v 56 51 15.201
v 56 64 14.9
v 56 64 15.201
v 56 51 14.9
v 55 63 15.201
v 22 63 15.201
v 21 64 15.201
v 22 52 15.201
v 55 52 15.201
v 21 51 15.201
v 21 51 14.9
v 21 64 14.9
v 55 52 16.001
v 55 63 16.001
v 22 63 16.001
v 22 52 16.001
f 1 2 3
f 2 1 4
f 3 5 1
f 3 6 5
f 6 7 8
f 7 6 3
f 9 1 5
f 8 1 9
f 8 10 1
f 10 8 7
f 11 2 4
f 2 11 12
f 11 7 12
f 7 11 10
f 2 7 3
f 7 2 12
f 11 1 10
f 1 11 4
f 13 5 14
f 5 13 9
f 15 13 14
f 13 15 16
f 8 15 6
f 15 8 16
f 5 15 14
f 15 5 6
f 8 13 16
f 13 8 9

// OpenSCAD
error = 0.2; // how much increase for error during print
height = 16.0;

module screwHole(center=[0,0,0]) {
    bottomClearance = 0.6;
    $fn=40;
    translate(center) translate([0,0,bottomClearance]) {
        difference() {
            cylinder(h=height - bottomClearance, d=6 + 2*1.2);
            translate([0,0,-0.1]) cylinder(h=height + 0.1, d= 3.5);
            translate([0,0,1.2]) cylinder(h=0.75, d1=3.5, d2=6); 
            translate([0,0,1.9]) cylinder(h=height, d=6); 
        }
    }
}

module switch() {
    translate([0,-2,0]) cube([32.5,2,15]); // front
    translate([2.25,0,1.5]) cube([28+2*error,35,12]); // case
    translate([08,0,0.8]) cube([3,4,13.4]); // dent for the small triangles at the side
    translate([21,0,0.8]) cube([3,4,13.4]); // dent for the small triangles at the side
    translate([-1.25,2,1.5]) cube([35,35,12]); // wider space inside
}

module black() {
    color("white") difference() {
        translate([-9.2,-1,0]) intersection() {
            translate([0.75,0.75,-0.75]) minkowski() {
                cube([148.5,78.5,height]);
                sphere(d=1.5, $fn=180);
            }
            cube([150,80,height]);
        };
        // free above PCB (enough for most parts)
        translate([-0.25,1,-0.1]) cube([101,60,12.6+0.1]);
        // chane to get power to the top of the pcb
        translate([100,6,10.1]) rotate([0,220,0]) mirror([1,0,0]) cube([101,50,12.6+0.1]);

        // opening for the ethernet ports
        translate([11.15,-1.1,-0.1]) cube([59.6,23,14.25+0.1]);
        translate([53.95,24.3,0.1]) cube([16.3,12.3, height]);
        
        // space above connector
        translate([84,13,-0.1]) cube([13,12.5,14.25+0.1]);
        
        // holes for the screws
        translate([150-9.2-5, 45 -1, -0.1]) cylinder(h=17, d=6, $fn=30);
        translate([5,3.75,0]) cylinder(h=17, d=6, $fn=30);
        translate([95,5,0]) cylinder(h=17, d=6, $fn=30);
        translate([95,55,0]) cylinder(h=17, d=6, $fn=30);
        translate([5,55,0]) cylinder(h=17, d=6, $fn=30);
        
        // thin area above LEDs and make sure no transparent parts is filled with black
        translate([22,52,-0.1]) cube([33,11,height - 1.0 +0.1]);
        transparent();
        
        // mark the LEDs
        for (x=[1:1:5])  translate([22 + x*4.75 - 4.75/2,57.5 + 10,height - 0.5]) linear_extrude(height = 0.55) text(text=str(x), size=5, valign = "center", halign = "center"); 
       translate([51,57.5 + 10,height - 0.5]) linear_extrude(height = 0.55) text(text="P", size=5, valign = "center", halign = "center"); 

        // mark the ports
        for (x=[1:1:4])  translate([10 + x*15 - 7.5,7,height - 0.5]) linear_extrude(height = 0.55) text(text=str(x), size=8, valign = "center", halign = "center"); 
       translate([75,30,height - 0.5]) linear_extrude(height = 0.55) text(text="5", size=8, valign = "center", halign = "center"); 
       translate([45,30,height - 0.5]) linear_extrude(height = 0.55) text(text="PC", size=8, valign = "center", halign = "center"); 

    }

    // pcb holder
    color("blue") screwHole(center=[5,3.75,0]);
    color("blue") screwHole(center=[95,5,0]);
    color("blue") screwHole(center=[95,55,0]);
    color("blue") screwHole(center=[5,55,0]);
    color("blue") screwHole(center=[150-9.2-5, 45 -1, 0]);

    // close the hole created for the switches
    color("blue") difference() {
        union() {
            translate([150-9.2 - 10, 4 -0.25, -10]) cube([8.0,33,12]);
            translate([150-9.2 - 2, 4 +2.7 , -10]) cube([2,27.5,12]);        
        }
        translate([150-9.2+0.1,4,-22.0]) rotate([0,0,90]) switch();
    }

    // LEDs
    color("blue") for (x=[22:4.75:50])  translate([x,50,0.75]) cube([0.8, 18, height - 0.75 - 0.8]);
    color("blue") translate([54.5,50,0.75]) cube([0.8, 18, height - 0.75 - 0.8]);
    color("blue") translate([22,50,5]) cube([33, 0.8, height - 5 - 0.8]);
    

}

module transparent() {
    translate([21,51,height - 1.1]) cube([35,13,0.301]);
    translate([22,52,height - 0.8]) cube([33,11,0.801]);
}

//black();
transparent();

//parts
//color("red") translate([100,60,-1.5]) rotate([0,0,180]) import("PCB.stl");
